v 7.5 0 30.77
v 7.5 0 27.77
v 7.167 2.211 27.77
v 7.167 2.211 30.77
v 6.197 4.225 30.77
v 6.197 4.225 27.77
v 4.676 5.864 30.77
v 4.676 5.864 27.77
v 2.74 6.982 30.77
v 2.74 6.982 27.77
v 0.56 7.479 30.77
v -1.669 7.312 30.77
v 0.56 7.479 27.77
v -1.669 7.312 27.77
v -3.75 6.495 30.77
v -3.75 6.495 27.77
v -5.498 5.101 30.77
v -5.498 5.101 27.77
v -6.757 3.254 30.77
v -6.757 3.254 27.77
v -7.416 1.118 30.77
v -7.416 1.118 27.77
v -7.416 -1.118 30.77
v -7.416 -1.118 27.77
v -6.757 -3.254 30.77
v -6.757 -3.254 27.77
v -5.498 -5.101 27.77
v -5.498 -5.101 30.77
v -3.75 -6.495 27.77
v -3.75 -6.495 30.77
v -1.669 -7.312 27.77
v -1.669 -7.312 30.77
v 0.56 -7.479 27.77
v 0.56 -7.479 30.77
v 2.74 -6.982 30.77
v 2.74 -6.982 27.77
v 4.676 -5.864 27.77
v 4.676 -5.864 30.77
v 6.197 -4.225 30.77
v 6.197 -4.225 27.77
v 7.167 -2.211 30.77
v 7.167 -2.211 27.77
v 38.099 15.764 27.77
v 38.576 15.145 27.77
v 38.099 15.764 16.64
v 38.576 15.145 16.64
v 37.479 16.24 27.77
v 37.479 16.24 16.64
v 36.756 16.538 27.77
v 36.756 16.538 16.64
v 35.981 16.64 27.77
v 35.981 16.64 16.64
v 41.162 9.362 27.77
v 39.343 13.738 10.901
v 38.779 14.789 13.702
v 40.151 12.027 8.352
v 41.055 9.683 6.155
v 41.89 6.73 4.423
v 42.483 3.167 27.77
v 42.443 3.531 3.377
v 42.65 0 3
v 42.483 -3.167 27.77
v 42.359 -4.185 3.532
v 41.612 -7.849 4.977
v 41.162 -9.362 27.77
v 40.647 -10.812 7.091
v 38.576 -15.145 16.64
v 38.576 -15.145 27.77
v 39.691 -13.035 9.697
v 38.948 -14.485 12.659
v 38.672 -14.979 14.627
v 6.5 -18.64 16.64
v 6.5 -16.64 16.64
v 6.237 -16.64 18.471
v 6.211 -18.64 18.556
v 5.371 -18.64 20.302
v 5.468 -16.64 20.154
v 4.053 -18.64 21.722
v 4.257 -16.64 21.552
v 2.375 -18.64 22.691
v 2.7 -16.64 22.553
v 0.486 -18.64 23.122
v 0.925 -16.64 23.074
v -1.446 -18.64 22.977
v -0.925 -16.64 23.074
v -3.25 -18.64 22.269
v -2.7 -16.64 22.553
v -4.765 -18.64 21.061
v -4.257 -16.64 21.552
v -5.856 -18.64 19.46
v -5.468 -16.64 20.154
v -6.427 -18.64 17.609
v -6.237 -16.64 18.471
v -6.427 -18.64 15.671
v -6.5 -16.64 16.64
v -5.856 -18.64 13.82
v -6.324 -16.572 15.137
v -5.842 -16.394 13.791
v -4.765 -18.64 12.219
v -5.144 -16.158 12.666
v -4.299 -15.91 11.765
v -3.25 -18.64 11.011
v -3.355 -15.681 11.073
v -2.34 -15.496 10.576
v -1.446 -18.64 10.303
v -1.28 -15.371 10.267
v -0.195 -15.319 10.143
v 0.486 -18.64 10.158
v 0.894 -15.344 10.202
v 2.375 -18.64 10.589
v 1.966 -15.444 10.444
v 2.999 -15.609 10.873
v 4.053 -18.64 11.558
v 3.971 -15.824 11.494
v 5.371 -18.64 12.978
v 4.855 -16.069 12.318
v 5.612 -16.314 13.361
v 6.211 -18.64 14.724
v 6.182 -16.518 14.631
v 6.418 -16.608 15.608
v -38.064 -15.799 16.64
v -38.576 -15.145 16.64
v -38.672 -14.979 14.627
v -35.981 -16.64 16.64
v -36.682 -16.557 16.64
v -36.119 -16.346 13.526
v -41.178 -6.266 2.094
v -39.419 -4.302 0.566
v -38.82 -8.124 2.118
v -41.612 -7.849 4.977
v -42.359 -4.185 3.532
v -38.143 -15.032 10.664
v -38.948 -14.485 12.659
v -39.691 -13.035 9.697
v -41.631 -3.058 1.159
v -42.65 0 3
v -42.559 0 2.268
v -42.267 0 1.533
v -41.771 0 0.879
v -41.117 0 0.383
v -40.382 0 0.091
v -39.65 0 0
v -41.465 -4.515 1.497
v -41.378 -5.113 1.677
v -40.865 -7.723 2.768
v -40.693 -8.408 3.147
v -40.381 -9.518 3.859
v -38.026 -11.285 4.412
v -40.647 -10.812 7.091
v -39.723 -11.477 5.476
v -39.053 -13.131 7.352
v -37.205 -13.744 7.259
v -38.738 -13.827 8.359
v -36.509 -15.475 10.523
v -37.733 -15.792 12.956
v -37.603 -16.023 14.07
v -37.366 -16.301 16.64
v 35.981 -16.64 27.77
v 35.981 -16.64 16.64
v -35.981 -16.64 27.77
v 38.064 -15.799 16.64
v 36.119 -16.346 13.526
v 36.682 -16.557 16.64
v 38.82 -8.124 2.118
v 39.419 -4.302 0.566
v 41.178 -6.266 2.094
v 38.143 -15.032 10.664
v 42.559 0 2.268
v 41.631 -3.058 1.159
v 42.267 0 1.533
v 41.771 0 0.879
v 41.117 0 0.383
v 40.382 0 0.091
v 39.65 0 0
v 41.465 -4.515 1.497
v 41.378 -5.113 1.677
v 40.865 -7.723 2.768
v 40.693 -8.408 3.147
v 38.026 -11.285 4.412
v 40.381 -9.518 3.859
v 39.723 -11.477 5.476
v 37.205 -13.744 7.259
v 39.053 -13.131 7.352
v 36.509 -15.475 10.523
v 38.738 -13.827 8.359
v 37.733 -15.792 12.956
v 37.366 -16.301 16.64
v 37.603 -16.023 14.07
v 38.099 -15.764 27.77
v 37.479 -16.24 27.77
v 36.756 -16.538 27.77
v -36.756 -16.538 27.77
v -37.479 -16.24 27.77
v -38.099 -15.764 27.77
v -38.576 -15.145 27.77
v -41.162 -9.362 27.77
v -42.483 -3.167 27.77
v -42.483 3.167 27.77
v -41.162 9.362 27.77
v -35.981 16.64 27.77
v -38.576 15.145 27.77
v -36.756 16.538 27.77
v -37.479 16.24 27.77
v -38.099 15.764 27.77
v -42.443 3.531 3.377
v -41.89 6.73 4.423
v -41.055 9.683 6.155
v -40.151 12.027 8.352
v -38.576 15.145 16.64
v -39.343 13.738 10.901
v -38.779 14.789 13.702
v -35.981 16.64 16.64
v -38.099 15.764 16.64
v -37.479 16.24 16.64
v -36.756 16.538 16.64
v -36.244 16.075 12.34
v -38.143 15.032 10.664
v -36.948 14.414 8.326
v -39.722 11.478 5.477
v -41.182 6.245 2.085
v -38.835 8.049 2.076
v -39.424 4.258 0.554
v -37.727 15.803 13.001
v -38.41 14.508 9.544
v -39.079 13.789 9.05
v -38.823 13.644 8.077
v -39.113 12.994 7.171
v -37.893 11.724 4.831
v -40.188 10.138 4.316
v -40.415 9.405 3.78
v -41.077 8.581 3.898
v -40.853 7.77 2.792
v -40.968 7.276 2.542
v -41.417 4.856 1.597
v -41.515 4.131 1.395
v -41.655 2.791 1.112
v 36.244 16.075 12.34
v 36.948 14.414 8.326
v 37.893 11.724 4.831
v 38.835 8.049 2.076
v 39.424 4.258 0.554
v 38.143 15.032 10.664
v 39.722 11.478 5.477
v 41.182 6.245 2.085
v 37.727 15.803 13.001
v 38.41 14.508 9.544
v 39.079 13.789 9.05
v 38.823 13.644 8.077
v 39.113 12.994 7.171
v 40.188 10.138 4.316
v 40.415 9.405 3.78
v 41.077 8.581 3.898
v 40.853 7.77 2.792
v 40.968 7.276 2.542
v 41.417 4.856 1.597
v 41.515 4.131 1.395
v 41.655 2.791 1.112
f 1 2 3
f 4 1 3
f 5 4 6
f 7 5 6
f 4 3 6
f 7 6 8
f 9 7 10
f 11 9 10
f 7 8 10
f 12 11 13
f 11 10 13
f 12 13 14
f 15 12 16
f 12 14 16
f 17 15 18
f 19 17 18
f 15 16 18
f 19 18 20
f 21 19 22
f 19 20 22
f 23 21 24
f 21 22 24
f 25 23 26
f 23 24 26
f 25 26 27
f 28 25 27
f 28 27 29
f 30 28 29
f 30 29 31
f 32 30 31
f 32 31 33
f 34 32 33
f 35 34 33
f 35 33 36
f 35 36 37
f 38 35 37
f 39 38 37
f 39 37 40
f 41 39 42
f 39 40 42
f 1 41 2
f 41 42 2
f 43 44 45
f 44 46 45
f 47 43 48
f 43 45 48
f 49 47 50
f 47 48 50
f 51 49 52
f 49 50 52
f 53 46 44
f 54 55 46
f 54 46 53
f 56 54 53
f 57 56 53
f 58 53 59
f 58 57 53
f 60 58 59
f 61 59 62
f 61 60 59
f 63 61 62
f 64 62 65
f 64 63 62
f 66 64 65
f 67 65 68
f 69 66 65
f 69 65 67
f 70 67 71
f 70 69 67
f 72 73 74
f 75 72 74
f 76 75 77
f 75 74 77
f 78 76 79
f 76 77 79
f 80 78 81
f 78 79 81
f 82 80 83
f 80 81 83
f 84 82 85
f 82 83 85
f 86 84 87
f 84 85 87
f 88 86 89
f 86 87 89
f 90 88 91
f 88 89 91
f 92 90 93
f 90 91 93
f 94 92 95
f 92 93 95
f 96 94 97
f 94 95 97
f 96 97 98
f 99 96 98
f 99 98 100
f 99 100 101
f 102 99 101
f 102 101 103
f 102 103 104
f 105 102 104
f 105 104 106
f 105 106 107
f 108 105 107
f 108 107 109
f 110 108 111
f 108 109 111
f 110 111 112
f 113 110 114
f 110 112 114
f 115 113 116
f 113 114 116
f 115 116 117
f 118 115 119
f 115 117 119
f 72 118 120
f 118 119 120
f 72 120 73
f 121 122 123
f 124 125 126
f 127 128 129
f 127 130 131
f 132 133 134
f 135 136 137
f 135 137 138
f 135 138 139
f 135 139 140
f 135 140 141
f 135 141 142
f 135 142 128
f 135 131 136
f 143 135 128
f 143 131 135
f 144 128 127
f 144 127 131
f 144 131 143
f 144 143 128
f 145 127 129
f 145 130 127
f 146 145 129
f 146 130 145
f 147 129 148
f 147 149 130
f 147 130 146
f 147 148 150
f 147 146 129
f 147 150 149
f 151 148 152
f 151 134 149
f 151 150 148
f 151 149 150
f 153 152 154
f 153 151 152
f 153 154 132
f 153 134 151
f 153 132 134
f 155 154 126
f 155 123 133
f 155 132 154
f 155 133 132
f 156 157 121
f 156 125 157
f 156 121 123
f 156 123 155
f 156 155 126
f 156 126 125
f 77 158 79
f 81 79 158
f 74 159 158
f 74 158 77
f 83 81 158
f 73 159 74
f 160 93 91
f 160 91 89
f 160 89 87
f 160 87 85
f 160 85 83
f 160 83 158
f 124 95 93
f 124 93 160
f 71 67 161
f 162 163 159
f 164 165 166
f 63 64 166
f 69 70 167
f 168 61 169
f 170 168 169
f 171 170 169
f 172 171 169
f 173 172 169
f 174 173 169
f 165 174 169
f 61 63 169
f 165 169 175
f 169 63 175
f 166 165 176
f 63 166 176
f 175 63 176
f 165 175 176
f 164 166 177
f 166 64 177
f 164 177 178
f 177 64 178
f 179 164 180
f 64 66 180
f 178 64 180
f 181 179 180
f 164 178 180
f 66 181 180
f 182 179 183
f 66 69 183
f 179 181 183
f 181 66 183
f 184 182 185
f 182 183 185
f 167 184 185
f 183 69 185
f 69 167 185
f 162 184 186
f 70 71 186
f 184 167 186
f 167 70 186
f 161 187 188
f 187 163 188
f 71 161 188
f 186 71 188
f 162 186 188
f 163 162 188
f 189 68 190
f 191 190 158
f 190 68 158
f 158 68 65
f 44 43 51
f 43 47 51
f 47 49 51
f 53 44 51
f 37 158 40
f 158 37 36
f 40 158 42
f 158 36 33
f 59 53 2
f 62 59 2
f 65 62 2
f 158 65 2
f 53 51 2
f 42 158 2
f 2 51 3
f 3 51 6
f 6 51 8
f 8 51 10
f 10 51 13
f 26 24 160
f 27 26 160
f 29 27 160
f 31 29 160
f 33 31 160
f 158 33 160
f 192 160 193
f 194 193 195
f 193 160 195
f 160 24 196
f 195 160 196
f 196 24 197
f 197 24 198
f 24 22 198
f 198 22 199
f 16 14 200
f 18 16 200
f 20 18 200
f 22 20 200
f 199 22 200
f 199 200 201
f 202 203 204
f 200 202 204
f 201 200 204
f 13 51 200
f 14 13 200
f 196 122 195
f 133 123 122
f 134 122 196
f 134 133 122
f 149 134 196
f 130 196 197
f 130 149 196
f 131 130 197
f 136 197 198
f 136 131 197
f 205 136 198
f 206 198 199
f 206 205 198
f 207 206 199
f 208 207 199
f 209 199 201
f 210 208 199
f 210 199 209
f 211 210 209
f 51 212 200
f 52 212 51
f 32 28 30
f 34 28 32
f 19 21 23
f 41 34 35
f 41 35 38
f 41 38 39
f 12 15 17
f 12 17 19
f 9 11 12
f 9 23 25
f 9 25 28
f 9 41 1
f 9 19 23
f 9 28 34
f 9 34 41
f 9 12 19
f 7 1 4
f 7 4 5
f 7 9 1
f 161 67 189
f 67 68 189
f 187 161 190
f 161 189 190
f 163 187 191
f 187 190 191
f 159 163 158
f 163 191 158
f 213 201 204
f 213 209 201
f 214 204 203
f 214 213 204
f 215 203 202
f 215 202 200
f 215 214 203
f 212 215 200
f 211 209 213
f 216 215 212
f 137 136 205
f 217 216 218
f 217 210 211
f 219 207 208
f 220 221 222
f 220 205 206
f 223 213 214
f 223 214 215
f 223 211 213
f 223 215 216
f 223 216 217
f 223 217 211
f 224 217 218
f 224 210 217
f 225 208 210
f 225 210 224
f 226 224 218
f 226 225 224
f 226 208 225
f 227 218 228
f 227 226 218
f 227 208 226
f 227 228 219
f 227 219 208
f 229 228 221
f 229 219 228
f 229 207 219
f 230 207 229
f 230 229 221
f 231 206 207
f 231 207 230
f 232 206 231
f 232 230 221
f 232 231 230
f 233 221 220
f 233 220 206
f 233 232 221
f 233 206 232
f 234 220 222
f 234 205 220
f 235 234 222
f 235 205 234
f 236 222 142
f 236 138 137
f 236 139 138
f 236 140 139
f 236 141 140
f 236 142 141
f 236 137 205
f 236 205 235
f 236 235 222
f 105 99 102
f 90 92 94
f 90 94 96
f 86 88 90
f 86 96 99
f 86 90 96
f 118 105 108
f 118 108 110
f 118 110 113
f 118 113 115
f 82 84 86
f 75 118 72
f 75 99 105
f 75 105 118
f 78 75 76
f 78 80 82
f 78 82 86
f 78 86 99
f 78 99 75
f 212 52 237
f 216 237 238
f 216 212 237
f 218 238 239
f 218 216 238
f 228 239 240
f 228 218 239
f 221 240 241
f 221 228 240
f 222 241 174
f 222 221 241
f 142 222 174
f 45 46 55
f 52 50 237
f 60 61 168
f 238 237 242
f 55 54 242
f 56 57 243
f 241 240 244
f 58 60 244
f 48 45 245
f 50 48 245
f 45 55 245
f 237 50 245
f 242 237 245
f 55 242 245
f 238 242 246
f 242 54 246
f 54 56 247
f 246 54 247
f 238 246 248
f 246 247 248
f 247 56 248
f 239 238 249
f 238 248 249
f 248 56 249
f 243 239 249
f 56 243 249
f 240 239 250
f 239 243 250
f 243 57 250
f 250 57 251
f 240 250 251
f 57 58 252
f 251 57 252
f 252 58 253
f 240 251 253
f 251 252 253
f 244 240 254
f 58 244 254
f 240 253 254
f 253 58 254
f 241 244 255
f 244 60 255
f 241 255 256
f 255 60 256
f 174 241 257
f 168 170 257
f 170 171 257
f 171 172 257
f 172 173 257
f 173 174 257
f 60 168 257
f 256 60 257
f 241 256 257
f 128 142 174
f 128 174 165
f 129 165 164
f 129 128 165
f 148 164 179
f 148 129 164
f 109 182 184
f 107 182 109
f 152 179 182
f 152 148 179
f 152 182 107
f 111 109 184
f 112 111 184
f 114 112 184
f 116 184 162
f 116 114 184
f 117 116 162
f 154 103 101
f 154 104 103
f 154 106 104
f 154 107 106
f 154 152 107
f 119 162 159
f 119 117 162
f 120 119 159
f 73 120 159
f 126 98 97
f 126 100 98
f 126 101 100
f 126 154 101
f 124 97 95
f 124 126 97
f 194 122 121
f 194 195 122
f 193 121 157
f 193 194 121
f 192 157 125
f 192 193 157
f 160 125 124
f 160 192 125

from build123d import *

# Parameters (mm, degrees)
BOSS_EXTRUDE1_DEPTH      = 27.77
FILLET1_START            = -44
FILLET1_DEPTH            = 88
FILLET2_R                = 3
SKETCH3_R                = 7.5
BOSS_EXTRUDE2_DEPTH      = 3
BOSS_EXTRUDE3_DEPTH      = 2
BOSS_EXTRUDE3_DEPTH_BACK = 3
SKETCH4_R                = 6.5


with BuildPart() as part:
    # Sketch2 → Boss-Extrude1 (new body)
    with BuildSketch(Plane.XY):
        with BuildLine():
            Line((-37.65, 16.64), (37.65, 16.64))
            ThreePointArc((37.65, 16.64), (42.65, 0), (37.65, -16.64))
            Line((37.65, -16.64), (-37.65, -16.64))
            ThreePointArc((-37.65, -16.64), (-42.65, 0), (-37.65, 16.64))
        make_face()
    extrude(amount=BOSS_EXTRUDE1_DEPTH)

    # Fillet1: read off the stored shape, not the designer's step
    # Fillet1 outline → Fillet1 (cut)
    with BuildSketch(Plane.YZ.offset(FILLET1_START)):
        with BuildLine():
            Line((16.64, 0), (16.64, 16.64))
            ThreePointArc((16.64, 16.64), (11.766256851, 4.873743173), (3.4e-08, 0))
            Line((3.4e-08, 0), (16.64, 0))
        make_face()
        with BuildLine():
            Line((-16.64, 0), (3.4e-08, 0))
            ThreePointArc((3.4e-08, 0), (-11.766256827, 4.873743149), (-16.64, 16.64))
            Line((-16.64, 16.64), (-16.64, 0))
        make_face()
    extrude(amount=FILLET1_DEPTH, mode=Mode.SUBTRACT)

    # Fillet2
    fillet2_edges = [part.edges().sort_by_distance(p)[0] for p in [
        (40.256336976, -11.781119236, 4.888624385),
        (-40.256337033, -11.781119103, 4.888624252),
        (-37.65, 16.64, 22.205),
        (37.65, 16.64, 22.205),
        (37.65, -16.64, 22.205),
        (-37.65, -16.64, 22.205),
    ]]
    fillet(fillet2_edges, radius=FILLET2_R)

    # Sketch3 → Boss-Extrude2 (add)
    with BuildSketch(Plane.XY.offset(27.77)):
        Circle(SKETCH3_R)
    extrude(amount=BOSS_EXTRUDE2_DEPTH)

    # Sketch4 → Boss-Extrude3 (add, two sides: drawn at the far end of the back side and taken through both)
    with BuildSketch(Plane.XZ.offset(16.64).offset(-BOSS_EXTRUDE3_DEPTH_BACK)):
        with Locations((0, 16.64)):
            Circle(SKETCH4_R)
    extrude(amount=BOSS_EXTRUDE3_DEPTH + BOSS_EXTRUDE3_DEPTH_BACK)


solid = part.part
